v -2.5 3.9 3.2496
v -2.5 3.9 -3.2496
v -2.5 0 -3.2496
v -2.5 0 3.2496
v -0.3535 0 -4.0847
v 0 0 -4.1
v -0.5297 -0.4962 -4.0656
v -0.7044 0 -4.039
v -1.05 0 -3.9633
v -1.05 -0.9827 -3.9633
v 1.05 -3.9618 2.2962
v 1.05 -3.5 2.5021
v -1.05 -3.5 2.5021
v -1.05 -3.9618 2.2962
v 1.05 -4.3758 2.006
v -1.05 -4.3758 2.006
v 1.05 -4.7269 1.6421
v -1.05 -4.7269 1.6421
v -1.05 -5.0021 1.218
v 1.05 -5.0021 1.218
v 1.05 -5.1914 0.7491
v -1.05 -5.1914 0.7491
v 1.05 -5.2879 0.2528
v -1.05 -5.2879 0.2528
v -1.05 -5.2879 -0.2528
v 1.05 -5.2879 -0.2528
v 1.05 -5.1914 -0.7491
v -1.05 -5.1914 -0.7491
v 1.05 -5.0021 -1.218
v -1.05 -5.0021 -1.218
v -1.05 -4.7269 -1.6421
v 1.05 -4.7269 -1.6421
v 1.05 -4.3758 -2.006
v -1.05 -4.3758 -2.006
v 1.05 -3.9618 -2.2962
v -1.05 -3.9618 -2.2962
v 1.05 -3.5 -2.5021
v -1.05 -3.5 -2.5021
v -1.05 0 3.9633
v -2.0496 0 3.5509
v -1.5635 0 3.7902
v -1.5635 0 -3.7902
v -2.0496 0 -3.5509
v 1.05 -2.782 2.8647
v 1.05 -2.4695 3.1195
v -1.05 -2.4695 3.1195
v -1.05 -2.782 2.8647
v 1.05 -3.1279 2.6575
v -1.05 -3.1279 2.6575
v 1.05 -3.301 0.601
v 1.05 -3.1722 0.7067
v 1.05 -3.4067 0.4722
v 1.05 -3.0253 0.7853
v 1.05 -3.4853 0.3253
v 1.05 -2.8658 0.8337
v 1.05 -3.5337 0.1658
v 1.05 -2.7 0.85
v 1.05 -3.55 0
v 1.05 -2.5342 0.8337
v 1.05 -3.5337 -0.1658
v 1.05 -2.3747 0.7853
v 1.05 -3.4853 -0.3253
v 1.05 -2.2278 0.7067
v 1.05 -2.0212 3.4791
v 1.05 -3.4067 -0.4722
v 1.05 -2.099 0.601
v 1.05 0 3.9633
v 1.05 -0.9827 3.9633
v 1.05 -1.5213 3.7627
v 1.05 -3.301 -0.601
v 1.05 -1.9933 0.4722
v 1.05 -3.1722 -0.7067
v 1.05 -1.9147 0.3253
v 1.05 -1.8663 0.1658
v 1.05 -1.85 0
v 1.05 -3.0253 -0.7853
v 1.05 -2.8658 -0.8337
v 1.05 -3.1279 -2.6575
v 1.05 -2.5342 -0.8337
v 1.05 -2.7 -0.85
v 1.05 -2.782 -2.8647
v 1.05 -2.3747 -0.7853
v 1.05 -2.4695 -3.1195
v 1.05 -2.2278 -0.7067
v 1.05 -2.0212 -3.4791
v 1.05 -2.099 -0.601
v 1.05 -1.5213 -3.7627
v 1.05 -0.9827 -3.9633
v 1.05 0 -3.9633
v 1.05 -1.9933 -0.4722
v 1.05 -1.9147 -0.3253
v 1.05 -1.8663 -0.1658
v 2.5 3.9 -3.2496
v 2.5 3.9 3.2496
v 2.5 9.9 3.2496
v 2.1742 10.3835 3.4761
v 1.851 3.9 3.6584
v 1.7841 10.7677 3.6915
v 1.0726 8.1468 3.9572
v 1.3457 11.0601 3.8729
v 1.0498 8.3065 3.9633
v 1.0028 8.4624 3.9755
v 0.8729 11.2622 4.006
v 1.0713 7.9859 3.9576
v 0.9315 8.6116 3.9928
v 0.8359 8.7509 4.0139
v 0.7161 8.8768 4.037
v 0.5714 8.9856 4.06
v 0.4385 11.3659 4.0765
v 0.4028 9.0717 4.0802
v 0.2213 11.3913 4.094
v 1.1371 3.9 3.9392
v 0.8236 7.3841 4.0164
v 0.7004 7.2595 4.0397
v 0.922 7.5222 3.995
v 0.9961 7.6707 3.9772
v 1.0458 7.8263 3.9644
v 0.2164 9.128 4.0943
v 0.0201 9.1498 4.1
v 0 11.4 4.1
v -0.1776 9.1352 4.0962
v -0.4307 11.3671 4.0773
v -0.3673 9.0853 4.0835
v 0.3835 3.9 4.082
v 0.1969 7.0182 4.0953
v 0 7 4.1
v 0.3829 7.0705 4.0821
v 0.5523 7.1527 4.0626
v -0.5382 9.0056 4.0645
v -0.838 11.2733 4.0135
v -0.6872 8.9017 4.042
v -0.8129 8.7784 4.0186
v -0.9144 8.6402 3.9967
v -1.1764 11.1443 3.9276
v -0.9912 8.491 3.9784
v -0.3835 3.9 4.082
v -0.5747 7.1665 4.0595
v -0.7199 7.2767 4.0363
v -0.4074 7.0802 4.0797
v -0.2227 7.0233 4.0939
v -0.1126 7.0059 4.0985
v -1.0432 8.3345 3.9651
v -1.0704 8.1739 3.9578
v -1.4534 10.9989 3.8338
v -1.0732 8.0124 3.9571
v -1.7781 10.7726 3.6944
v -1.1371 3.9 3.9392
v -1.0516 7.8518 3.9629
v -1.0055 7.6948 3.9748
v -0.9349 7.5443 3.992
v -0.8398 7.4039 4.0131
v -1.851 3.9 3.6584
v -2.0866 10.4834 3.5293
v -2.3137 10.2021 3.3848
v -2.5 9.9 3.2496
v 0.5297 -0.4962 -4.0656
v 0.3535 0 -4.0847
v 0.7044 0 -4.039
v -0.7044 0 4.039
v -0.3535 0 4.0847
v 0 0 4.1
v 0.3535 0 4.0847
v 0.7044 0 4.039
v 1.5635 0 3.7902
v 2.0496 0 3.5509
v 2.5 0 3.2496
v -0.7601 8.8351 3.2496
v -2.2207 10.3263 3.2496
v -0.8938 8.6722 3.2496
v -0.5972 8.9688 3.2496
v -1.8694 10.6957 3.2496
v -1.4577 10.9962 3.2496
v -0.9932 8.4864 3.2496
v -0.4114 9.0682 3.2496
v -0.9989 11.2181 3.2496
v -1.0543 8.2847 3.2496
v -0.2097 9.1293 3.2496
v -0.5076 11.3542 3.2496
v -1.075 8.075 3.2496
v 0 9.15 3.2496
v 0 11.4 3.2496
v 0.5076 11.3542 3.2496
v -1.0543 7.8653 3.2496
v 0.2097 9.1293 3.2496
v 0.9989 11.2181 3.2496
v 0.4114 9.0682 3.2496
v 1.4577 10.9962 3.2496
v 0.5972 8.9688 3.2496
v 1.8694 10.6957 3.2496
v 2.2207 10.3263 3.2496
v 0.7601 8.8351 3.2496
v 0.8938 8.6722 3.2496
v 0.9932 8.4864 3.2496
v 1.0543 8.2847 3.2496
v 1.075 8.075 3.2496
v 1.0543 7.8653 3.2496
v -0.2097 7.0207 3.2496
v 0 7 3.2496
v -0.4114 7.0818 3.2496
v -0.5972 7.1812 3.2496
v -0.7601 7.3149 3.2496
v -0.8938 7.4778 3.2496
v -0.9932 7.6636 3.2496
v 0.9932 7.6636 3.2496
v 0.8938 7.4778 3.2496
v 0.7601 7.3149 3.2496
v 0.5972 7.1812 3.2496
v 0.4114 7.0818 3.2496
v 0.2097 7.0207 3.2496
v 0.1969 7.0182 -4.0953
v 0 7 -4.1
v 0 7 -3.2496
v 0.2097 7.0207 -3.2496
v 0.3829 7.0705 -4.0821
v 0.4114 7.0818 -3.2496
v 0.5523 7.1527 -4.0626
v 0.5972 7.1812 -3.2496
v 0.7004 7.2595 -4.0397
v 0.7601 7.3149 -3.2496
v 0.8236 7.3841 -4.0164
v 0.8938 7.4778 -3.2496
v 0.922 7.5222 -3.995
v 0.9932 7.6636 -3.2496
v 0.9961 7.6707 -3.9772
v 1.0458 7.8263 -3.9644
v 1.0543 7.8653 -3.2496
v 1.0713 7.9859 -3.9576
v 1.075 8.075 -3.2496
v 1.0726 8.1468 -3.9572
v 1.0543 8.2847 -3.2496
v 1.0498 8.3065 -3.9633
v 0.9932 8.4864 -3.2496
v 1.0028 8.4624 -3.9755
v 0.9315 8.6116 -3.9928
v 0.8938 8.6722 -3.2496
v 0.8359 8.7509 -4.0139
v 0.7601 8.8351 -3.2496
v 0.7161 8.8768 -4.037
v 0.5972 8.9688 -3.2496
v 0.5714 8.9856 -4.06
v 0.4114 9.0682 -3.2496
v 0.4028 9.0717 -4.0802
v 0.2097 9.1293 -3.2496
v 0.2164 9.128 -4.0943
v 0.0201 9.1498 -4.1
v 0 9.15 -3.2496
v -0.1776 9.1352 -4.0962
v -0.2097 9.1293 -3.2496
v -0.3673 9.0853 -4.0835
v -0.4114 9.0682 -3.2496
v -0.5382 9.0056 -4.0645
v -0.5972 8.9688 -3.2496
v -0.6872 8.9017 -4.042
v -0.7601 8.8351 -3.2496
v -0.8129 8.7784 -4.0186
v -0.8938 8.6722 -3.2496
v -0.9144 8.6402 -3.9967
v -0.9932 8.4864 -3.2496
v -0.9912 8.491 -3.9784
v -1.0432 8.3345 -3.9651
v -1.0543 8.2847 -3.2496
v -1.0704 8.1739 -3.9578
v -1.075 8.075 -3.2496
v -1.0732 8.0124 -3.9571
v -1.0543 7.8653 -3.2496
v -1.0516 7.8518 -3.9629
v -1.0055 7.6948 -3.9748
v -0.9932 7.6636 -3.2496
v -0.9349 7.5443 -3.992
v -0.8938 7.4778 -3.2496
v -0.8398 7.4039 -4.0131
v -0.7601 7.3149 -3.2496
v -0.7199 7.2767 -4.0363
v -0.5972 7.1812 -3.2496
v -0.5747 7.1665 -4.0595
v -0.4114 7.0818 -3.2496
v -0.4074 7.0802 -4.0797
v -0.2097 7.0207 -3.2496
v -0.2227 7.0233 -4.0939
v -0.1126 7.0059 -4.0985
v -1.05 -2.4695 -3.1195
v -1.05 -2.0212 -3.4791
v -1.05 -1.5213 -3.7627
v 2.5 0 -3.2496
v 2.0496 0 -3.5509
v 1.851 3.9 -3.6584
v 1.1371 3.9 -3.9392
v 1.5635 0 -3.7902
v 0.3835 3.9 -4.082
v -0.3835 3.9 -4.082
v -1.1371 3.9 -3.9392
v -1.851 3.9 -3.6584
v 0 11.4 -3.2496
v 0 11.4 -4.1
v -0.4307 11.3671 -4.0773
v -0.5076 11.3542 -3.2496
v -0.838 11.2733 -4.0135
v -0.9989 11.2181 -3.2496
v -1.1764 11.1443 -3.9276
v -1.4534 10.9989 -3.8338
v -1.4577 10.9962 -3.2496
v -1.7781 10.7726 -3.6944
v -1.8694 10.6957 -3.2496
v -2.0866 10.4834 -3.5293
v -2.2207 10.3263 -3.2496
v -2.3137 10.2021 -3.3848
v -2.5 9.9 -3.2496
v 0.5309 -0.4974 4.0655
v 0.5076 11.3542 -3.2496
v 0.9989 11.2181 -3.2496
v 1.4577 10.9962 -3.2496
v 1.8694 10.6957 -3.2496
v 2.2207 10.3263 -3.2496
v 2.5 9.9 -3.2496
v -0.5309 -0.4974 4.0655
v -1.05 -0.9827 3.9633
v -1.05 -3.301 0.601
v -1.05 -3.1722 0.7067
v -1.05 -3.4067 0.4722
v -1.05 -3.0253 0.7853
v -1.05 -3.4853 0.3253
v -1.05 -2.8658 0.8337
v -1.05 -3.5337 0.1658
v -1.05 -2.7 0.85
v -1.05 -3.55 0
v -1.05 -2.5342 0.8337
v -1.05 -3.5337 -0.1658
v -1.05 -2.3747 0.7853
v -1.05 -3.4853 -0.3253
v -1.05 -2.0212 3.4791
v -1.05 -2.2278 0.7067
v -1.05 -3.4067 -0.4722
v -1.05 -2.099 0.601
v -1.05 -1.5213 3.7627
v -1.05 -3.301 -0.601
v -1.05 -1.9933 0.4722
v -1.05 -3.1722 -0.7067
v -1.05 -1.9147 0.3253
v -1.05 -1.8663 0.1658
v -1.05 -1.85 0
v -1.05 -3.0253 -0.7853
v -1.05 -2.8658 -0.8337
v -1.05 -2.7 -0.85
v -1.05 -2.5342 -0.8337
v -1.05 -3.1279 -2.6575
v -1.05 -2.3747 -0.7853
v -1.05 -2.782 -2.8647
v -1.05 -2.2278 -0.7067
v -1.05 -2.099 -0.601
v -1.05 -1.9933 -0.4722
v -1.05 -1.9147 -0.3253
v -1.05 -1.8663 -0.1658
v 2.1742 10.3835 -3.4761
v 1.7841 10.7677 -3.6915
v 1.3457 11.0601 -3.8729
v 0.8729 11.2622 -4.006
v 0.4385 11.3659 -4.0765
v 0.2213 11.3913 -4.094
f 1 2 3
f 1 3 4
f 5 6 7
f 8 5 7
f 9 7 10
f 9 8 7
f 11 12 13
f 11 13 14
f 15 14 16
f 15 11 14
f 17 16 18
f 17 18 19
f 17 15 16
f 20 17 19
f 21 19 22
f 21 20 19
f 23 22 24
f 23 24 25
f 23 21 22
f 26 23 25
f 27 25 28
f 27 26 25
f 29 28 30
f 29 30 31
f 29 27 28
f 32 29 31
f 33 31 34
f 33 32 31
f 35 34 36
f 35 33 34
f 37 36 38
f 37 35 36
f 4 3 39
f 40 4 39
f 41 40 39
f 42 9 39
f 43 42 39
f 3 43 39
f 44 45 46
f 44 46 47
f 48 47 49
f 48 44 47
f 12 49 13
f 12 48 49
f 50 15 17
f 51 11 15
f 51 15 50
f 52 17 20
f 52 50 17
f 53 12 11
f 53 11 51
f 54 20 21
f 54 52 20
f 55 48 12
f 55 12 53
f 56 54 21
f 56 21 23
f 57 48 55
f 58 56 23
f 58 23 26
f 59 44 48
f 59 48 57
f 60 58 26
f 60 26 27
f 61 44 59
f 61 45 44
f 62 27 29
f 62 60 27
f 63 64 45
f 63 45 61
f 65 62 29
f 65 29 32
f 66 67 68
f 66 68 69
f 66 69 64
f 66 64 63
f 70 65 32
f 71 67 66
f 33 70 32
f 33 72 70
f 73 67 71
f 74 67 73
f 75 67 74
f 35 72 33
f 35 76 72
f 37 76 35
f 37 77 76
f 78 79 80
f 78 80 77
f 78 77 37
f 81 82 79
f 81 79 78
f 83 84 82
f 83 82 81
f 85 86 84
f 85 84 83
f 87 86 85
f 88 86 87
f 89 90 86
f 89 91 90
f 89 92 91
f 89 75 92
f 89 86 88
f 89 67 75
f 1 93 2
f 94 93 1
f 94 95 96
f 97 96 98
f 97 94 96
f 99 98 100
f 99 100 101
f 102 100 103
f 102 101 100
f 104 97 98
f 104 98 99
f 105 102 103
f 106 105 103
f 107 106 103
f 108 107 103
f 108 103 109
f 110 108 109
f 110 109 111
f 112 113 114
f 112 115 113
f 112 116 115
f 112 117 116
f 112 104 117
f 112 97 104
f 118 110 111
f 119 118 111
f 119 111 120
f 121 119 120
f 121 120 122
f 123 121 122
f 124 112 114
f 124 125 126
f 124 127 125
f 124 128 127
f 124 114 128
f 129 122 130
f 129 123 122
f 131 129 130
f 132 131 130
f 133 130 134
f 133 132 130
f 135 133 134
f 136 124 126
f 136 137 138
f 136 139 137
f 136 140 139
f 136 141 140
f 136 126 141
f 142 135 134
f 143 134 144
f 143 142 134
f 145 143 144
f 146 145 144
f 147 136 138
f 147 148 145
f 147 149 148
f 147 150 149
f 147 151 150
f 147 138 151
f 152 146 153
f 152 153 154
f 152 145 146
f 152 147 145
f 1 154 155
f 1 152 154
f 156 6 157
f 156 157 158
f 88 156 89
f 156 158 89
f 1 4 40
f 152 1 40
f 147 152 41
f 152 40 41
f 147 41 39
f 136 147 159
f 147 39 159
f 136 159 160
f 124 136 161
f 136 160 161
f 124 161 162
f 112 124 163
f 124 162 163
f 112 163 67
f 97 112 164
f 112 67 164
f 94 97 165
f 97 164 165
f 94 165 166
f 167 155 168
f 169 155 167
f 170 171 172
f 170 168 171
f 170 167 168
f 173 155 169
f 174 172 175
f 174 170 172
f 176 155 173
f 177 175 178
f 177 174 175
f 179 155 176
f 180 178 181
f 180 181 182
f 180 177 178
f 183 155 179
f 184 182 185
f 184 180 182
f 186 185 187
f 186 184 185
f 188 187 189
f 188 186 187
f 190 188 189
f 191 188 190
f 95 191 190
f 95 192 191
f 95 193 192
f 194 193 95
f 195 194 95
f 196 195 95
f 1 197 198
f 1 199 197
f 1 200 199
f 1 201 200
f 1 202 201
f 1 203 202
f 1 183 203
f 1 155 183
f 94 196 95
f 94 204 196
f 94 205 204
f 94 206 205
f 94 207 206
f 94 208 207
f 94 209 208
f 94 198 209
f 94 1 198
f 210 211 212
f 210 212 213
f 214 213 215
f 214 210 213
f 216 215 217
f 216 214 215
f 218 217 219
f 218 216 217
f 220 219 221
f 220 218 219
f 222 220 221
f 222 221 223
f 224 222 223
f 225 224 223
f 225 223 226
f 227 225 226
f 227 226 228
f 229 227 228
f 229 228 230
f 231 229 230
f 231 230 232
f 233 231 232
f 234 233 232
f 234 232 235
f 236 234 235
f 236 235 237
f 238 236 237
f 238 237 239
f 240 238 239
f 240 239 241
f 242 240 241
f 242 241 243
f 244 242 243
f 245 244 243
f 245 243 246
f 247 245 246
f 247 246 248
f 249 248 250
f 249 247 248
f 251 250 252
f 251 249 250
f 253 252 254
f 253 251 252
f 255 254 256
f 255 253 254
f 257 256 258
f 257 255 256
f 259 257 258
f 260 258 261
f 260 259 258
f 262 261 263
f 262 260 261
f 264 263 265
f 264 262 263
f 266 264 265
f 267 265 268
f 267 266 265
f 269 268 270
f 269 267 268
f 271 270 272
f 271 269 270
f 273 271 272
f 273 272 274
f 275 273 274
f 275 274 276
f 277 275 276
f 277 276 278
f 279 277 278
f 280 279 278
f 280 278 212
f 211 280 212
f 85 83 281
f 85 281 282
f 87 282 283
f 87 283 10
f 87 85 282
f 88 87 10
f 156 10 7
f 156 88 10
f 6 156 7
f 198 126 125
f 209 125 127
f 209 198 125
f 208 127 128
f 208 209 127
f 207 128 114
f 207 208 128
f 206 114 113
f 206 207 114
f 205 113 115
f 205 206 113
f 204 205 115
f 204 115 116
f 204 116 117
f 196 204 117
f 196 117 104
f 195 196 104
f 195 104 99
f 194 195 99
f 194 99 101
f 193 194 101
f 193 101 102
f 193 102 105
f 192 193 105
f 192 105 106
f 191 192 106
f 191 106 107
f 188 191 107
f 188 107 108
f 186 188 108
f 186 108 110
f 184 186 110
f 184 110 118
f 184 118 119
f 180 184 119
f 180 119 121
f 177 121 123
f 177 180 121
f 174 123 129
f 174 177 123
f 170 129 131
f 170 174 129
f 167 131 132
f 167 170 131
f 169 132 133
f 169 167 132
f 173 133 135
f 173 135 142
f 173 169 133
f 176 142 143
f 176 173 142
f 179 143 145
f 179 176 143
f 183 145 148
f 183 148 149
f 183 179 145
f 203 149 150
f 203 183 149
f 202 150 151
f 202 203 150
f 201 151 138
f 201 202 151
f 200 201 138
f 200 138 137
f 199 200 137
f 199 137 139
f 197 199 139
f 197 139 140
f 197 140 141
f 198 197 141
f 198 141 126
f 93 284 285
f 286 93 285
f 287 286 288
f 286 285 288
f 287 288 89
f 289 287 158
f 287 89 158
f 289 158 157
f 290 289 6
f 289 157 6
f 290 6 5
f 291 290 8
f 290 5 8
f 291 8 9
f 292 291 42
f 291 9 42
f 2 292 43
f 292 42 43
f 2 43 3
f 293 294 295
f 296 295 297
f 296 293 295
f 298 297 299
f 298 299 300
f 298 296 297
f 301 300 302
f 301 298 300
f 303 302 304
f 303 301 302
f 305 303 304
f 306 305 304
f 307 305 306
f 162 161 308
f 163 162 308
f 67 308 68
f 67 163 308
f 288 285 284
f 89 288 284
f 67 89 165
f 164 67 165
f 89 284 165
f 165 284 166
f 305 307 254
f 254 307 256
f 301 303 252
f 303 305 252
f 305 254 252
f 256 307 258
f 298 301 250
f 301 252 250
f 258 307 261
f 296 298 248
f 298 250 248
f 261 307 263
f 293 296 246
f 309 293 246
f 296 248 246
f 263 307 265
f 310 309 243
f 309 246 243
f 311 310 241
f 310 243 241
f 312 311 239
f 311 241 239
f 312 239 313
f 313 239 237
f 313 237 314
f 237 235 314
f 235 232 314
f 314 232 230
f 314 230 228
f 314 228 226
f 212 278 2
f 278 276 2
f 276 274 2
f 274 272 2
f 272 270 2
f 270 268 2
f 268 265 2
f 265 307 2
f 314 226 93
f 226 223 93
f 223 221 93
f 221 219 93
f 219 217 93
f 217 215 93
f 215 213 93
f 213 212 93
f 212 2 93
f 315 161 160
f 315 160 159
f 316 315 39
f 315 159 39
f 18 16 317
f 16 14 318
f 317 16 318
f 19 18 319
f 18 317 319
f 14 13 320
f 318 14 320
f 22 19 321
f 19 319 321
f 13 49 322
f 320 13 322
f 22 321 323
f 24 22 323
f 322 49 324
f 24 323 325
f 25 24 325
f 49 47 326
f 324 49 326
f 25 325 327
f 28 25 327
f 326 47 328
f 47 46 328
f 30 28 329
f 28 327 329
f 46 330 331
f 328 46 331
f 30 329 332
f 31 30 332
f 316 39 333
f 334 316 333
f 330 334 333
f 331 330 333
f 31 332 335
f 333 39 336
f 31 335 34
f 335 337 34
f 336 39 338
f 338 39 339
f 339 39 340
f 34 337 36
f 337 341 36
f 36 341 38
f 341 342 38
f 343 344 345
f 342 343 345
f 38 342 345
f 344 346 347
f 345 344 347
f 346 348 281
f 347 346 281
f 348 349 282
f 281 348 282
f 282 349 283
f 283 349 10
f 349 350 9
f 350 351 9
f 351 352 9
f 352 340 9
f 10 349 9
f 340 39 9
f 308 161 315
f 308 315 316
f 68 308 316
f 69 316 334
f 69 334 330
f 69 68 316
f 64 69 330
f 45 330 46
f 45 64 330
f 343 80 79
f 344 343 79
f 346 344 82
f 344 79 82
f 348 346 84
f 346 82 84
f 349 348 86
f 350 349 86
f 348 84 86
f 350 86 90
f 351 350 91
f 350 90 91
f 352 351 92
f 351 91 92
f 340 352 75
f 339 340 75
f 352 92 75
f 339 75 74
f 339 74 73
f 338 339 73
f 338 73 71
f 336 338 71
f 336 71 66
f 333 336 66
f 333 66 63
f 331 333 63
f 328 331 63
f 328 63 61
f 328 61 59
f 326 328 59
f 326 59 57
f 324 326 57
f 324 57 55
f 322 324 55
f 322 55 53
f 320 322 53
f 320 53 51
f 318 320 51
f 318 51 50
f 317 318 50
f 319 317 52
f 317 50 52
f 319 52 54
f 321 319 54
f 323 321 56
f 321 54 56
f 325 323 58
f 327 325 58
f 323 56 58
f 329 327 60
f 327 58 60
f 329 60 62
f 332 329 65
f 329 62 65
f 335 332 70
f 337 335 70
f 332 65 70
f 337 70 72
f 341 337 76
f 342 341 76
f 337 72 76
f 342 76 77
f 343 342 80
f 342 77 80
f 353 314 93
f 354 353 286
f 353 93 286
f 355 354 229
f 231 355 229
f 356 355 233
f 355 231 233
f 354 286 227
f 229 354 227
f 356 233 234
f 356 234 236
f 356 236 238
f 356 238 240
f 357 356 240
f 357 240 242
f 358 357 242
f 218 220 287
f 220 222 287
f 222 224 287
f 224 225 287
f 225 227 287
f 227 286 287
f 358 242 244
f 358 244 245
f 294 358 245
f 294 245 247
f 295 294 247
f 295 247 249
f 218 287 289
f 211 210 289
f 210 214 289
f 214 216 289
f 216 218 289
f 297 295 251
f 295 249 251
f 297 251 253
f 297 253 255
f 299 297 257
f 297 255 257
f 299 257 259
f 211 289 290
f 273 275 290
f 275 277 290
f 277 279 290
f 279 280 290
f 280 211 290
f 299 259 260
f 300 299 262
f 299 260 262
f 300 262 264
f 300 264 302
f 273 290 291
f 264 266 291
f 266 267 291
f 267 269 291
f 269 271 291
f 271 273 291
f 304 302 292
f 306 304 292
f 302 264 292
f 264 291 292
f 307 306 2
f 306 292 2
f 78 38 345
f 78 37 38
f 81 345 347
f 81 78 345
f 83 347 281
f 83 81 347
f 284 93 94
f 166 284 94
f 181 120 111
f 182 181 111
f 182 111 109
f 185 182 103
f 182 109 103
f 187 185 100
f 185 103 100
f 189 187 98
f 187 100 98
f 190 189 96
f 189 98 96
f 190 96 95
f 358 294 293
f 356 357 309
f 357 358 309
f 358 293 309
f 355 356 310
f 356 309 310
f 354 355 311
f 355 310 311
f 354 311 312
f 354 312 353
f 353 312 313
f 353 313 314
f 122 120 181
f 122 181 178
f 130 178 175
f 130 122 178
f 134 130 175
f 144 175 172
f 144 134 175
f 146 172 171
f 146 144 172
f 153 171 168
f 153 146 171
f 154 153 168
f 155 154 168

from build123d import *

# Parameters (mm, degrees)
SKETCH2_R               = 4.1
BOSS_EXTRUDE1_DEPTH     = 3.9
CUT_EXTRUDE1_DEPTH      = 7.987846592
BOSS_EXTRUDE2_DEPTH     = 7.5
CUT_EXTRUDE2_DEPTH      = 15.263590011
CUT_EXTRUDE2_DEPTH_BACK = 15.263590011
SKETCH5_R               = 1.075
CUT_EXTRUDE3_DEPTH      = 15.263590166
BOSS_EXTRUDE3_DEPTH     = 1.05
CUT_EXTRUDE4_DEPTH      = 13.370125448
CUT_EXTRUDE5_REACH      = 14.624
SKETCH9_R               = 0.85


with BuildPart() as part:
    # Sketch2 → Boss-Extrude1 (new body)
    with BuildSketch(Plane(origin=(0, 0, 0), x_dir=(1, 0, 0), z_dir=(0, 1, 0))):
        with Locations(Location((0, 0, 0), (0, 0, 270))):
            Circle(SKETCH2_R)
    extrude(amount=BOSS_EXTRUDE1_DEPTH)

    # Sketch3 → Cut-Extrude1 (cut, through all)
    with BuildSketch(Plane(origin=(0, 3.9, 0), x_dir=(1, 0, 0), z_dir=(0, 1, 0))):
        with BuildLine():
            Line((-2.5, 3.249615362), (-2.5, -3.249615362))
            ThreePointArc((-2.5, -3.249615362), (-4.1, 0), (-2.5, 3.249615362))
        make_face()
        with BuildLine():
            Line((2.5, 3.249615362), (2.5, -3.249615362))
            ThreePointArc((2.5, -3.249615362), (4.1, 0), (2.5, 3.249615362))
        make_face()
    extrude(amount=-CUT_EXTRUDE1_DEPTH, mode=Mode.SUBTRACT)

    # Sketch4 → Boss-Extrude2 (add)
    with BuildSketch(Plane(origin=(0, 3.9, 0), x_dir=(1, 0, 0), z_dir=(0, 1, 0))):
        with BuildLine():
            Line((-2.5, -3.249615362), (2.5, -3.249615362))
            ThreePointArc((2.5, -3.249615362), (0, -4.1), (-2.5, -3.249615362))
        make_face()
        with BuildLine():
            Line((-2.5, 3.249615362), (2.5, 3.249615362))
            ThreePointArc((2.5, 3.249615362), (0, 4.1), (-2.5, 3.249615362))
        make_face()
    extrude(amount=BOSS_EXTRUDE2_DEPTH)

    # Sketch5 → Cut-Extrude2 (cut, two sides: drawn at the far end of the back side and taken through both)
    with BuildSketch(Plane.XY.offset(4.1).offset(-CUT_EXTRUDE2_DEPTH_BACK)):
        with Locations(Location((0, 8.075, 0), (0, 0, 270))):
            Circle(SKETCH5_R)
    extrude(amount=CUT_EXTRUDE2_DEPTH + CUT_EXTRUDE2_DEPTH_BACK, mode=Mode.SUBTRACT)

    # Sketch6 → Cut-Extrude3 (cut, through all)
    with BuildSketch(Plane.XY.offset(4.1)):
        with BuildLine():
            Line((-2.5, 9.9), (-2.5, 11.4))
            Line((-2.5, 11.4), (0, 11.4))
            ThreePointArc((0, 11.4), (-1.457737974, 10.996229956), (-2.5, 9.9))
        make_face()
    cut_extrude3 = extrude(amount=-CUT_EXTRUDE3_DEPTH, mode=Mode.SUBTRACT)

    # Mirror1: Cut-Extrude3 across plane
    add(cut_extrude3.mirror(Plane(origin=(0, 0, 0), x_dir=(0, 0, 1), z_dir=(1, 0, 0))), mode=Mode.SUBTRACT)

    # Sketch7 → Boss-Extrude3 (add, symmetric)
    with BuildSketch(Plane(origin=(0, 0, 0), x_dir=(0, 0, -1), z_dir=(1, 0, 0))):
        with BuildLine():
            Line((4.1, 0), (-4.1, 0))
            ThreePointArc((-4.1, 0), (-3.845898176, -1.328520002), (-3.11946367, -2.469495917))
            ThreePointArc((-3.11946367, -2.469495917), (-2.754870811, -2.951250255), (-2.502108249, -3.5))
            ThreePointArc((-2.502108249, -3.5), (0, -5.3), (2.502108249, -3.5))
            ThreePointArc((2.502108249, -3.5), (2.754870811, -2.951250255), (3.11946367, -2.469495917))
            ThreePointArc((3.11946367, -2.469495917), (3.845898176, -1.328520002), (4.1, 0))
        make_face()
    extrude(amount=BOSS_EXTRUDE3_DEPTH, both=True)

    # Sketch8 → Cut-Extrude4 (cut, through all)
    with BuildSketch(Plane(origin=(0, 0, 0), x_dir=(1, 0, 0), z_dir=(0, 1, 0))):
        with BuildLine():
            Line((-1.05, -3.963268853), (-1.05, -4.1))
            Line((-1.05, -4.1), (0, -4.1))
            ThreePointArc((0, -4.1), (-0.529432575, -4.065673517), (-1.05, -3.963268853))
        make_face()
        with BuildLine():
            Line((-1.05, 4.1), (0, 4.1))
            ThreePointArc((0, 4.1), (-0.529432575, 4.065673517), (-1.05, 3.963268853))
            Line((-1.05, 3.963268853), (-1.05, 4.1))
        make_face()
    cut_extrude4 = extrude(amount=-CUT_EXTRUDE4_DEPTH, mode=Mode.SUBTRACT)

    # Mirror2: Cut-Extrude4 across plane
    add(cut_extrude4.mirror(Plane(origin=(0, 0, 0), x_dir=(0, 0, 1), z_dir=(1, 0, 0))), mode=Mode.SUBTRACT)

    # Sketch9 → Cut-Extrude5 (cut, up to next)
    with BuildSketch(Plane(origin=(1.05, 0, 0), x_dir=(0, 0, -1), z_dir=(1, 0, 0)), mode=Mode.PRIVATE) as cut_extrude5_sk1:
        with Locations((0, -2.7)):
            Circle(SKETCH9_R)
    cut_extrude5_tool1 = extrude(cut_extrude5_sk1.sketch, amount=-CUT_EXTRUDE5_REACH, mode=Mode.PRIVATE) & part.part
    add(cut_extrude5_tool1.solids().sort_by_distance((1.05, -2.7, 0))[0], mode=Mode.SUBTRACT)


solid = part.part
